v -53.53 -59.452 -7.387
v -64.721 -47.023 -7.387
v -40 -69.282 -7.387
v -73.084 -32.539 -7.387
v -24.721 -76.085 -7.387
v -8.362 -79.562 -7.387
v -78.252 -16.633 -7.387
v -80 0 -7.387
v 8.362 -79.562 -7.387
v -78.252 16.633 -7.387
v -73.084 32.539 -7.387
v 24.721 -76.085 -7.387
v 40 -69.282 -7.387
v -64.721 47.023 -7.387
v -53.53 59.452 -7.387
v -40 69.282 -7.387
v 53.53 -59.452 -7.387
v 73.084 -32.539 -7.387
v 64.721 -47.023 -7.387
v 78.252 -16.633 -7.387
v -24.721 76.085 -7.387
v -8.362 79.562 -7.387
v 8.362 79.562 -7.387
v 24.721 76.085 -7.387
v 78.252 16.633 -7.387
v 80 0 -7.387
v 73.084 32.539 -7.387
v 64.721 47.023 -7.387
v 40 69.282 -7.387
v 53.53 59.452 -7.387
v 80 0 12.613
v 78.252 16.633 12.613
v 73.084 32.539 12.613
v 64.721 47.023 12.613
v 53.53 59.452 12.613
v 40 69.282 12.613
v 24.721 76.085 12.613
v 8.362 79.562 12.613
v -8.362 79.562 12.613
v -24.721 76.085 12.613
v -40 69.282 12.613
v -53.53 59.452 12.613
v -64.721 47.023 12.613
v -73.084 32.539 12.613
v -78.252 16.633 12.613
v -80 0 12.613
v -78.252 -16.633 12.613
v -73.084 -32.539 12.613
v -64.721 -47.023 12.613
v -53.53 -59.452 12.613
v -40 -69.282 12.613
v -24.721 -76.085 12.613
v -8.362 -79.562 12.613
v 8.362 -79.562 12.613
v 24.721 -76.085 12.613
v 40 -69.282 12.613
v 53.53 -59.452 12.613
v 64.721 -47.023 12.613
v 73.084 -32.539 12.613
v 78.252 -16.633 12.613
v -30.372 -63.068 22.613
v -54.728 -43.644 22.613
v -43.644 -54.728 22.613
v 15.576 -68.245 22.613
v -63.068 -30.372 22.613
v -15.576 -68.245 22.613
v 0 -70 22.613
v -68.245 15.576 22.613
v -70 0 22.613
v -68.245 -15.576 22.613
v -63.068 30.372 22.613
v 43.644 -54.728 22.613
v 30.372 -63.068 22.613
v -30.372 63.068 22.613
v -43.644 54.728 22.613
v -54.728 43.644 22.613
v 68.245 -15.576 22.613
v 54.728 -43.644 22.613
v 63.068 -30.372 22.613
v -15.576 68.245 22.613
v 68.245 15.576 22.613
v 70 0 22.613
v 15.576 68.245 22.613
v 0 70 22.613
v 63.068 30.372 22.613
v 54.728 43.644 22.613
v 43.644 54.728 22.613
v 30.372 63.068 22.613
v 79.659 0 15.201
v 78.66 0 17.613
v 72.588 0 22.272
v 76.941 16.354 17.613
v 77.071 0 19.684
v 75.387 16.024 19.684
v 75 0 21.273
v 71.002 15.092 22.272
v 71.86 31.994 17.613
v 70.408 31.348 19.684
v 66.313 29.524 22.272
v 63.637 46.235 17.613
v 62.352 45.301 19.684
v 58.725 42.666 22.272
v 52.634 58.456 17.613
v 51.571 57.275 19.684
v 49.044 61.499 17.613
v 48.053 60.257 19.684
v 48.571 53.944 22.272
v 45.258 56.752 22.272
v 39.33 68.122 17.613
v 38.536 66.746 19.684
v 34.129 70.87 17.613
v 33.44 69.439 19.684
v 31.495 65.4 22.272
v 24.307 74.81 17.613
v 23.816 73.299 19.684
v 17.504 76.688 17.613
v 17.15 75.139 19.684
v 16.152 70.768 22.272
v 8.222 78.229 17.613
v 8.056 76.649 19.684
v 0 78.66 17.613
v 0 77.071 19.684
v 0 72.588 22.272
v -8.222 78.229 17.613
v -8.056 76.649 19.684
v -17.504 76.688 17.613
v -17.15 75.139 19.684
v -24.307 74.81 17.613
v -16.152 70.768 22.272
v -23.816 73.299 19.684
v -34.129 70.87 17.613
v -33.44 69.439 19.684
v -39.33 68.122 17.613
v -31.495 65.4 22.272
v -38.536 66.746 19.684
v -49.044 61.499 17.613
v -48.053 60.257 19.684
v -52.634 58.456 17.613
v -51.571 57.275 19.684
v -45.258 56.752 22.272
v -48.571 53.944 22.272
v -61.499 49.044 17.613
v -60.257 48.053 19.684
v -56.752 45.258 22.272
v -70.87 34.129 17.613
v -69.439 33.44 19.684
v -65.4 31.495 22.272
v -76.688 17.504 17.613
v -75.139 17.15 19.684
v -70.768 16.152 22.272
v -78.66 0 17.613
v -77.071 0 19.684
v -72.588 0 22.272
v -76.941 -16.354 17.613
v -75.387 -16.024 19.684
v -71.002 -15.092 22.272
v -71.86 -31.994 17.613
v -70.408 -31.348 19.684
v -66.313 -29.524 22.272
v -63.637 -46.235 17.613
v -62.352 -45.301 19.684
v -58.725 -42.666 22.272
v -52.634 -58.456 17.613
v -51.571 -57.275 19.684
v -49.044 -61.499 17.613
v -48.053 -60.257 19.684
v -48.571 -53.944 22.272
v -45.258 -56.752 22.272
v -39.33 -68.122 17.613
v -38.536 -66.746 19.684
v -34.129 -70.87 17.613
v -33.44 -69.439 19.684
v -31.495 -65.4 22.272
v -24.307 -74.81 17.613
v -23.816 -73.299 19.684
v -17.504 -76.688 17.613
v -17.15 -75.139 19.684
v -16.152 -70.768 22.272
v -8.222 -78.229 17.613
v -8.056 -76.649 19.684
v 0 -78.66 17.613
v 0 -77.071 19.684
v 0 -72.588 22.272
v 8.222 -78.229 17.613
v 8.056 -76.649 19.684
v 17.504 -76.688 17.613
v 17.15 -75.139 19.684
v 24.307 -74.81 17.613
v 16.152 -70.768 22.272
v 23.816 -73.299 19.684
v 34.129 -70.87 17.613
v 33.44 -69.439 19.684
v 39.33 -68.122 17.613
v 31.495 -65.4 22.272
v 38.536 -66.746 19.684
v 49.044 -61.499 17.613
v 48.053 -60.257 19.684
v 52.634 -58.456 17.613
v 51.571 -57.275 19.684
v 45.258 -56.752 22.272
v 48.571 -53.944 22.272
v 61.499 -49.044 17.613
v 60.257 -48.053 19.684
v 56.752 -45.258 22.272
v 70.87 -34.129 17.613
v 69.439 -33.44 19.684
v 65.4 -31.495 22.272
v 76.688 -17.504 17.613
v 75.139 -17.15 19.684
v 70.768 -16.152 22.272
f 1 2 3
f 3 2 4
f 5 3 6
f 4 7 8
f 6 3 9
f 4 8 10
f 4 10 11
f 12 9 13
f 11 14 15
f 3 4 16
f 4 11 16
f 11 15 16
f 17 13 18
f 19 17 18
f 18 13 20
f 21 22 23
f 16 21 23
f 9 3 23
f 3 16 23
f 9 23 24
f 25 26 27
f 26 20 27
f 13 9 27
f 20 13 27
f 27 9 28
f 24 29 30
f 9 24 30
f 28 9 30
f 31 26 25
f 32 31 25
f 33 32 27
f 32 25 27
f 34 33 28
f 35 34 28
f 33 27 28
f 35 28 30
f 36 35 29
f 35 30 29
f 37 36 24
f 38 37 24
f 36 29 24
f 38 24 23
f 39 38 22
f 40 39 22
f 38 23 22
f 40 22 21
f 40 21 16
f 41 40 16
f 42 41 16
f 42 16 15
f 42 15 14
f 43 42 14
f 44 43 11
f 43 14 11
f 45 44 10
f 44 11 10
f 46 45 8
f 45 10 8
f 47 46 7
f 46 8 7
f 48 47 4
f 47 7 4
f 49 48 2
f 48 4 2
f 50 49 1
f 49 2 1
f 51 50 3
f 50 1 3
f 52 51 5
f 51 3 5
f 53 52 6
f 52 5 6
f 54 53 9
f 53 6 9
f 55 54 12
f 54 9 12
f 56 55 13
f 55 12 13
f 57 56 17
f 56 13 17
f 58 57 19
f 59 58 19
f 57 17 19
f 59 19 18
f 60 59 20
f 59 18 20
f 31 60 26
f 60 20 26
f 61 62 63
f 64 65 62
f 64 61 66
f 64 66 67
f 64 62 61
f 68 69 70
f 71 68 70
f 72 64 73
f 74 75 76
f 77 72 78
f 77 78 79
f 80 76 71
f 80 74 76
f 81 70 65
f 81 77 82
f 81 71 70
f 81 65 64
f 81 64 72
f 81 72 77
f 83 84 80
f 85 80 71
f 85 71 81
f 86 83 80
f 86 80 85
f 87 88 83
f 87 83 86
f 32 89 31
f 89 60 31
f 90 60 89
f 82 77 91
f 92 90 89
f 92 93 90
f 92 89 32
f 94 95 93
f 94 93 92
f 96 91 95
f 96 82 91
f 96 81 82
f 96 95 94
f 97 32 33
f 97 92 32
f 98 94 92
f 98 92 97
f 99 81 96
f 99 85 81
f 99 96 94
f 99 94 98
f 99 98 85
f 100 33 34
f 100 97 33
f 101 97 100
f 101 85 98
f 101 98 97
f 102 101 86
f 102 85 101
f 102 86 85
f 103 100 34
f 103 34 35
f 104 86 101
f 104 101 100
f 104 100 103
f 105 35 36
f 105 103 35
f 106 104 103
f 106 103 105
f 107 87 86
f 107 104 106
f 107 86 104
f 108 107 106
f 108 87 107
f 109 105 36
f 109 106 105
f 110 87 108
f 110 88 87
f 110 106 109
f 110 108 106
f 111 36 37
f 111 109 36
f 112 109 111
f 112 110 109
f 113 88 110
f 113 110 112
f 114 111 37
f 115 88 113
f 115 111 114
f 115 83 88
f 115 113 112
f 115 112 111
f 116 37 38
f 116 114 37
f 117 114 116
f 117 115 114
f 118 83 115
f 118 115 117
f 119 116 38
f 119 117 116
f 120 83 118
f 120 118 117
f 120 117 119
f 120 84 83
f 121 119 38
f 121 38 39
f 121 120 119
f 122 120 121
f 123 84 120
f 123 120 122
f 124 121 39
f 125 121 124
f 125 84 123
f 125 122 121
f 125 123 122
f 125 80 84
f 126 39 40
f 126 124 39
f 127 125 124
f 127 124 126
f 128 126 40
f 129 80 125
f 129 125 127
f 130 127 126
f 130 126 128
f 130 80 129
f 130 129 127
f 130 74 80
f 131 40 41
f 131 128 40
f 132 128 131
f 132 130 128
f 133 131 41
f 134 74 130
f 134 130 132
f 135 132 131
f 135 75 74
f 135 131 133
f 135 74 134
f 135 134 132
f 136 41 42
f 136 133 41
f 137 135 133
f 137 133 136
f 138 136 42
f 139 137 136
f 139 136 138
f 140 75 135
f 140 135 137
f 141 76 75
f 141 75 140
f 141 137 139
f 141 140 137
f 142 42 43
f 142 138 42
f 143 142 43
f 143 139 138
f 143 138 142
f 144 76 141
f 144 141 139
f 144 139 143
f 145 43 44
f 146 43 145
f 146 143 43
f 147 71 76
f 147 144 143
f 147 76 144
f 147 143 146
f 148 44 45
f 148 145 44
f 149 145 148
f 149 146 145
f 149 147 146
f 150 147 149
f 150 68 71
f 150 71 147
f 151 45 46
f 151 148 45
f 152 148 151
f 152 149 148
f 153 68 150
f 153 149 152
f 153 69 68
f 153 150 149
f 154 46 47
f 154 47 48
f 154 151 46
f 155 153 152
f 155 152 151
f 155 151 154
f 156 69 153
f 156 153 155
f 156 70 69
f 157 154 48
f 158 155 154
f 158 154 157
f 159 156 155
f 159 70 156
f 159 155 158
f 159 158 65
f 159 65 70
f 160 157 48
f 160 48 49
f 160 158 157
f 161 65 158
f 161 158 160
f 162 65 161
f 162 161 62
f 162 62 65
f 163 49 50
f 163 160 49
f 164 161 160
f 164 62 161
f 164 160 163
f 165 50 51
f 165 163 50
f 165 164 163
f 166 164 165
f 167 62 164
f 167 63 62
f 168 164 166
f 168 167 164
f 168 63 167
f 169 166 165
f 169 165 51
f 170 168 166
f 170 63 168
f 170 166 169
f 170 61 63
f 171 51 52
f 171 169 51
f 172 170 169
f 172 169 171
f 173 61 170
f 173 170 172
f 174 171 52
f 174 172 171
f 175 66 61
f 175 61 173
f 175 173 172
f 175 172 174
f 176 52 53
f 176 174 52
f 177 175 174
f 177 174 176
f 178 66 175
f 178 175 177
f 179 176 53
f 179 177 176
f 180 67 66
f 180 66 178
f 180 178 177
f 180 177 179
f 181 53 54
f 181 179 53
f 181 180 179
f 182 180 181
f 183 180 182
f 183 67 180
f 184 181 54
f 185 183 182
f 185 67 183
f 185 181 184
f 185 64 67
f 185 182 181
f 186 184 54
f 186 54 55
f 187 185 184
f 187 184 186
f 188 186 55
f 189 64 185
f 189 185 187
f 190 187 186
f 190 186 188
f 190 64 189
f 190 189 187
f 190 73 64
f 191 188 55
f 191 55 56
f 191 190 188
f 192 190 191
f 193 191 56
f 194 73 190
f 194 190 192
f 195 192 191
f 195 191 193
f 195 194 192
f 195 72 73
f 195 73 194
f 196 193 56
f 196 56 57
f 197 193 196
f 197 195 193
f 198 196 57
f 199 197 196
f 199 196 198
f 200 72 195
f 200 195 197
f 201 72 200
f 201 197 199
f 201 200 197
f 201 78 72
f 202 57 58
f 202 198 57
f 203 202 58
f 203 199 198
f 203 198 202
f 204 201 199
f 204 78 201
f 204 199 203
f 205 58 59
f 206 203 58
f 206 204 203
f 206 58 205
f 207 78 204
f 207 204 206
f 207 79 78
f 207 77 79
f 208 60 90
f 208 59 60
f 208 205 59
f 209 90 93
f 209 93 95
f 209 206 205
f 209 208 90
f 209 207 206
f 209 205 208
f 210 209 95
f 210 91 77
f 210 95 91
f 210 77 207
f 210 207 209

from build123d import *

# Parameters (mm, degrees)
SKETCH1_R           = 40
BOSS_EXTRUDE1_DEPTH = 15
FILLET1_R           = 5
SCALE1_SCALE        = 2


with BuildPart() as part:
    # Sketch1 → Boss-Extrude1 (new body)
    with BuildSketch(Plane.XY):
        Circle(SKETCH1_R)
    extrude(amount=BOSS_EXTRUDE1_DEPTH)

    # Fillet1
    fillet1_edges = [part.edges().sort_by_distance(p)[0] for p in [
        (-40, 0, 15),
    ]]
    fillet(fillet1_edges, radius=FILLET1_R)


with BuildPart() as part_1:
    # Scale1: scaled about (0, 0, 7.387306203)
    add(part.part.scale(SCALE1_SCALE).moved(Location((0, 0, -7.387306203))))


solid = part_1.part
